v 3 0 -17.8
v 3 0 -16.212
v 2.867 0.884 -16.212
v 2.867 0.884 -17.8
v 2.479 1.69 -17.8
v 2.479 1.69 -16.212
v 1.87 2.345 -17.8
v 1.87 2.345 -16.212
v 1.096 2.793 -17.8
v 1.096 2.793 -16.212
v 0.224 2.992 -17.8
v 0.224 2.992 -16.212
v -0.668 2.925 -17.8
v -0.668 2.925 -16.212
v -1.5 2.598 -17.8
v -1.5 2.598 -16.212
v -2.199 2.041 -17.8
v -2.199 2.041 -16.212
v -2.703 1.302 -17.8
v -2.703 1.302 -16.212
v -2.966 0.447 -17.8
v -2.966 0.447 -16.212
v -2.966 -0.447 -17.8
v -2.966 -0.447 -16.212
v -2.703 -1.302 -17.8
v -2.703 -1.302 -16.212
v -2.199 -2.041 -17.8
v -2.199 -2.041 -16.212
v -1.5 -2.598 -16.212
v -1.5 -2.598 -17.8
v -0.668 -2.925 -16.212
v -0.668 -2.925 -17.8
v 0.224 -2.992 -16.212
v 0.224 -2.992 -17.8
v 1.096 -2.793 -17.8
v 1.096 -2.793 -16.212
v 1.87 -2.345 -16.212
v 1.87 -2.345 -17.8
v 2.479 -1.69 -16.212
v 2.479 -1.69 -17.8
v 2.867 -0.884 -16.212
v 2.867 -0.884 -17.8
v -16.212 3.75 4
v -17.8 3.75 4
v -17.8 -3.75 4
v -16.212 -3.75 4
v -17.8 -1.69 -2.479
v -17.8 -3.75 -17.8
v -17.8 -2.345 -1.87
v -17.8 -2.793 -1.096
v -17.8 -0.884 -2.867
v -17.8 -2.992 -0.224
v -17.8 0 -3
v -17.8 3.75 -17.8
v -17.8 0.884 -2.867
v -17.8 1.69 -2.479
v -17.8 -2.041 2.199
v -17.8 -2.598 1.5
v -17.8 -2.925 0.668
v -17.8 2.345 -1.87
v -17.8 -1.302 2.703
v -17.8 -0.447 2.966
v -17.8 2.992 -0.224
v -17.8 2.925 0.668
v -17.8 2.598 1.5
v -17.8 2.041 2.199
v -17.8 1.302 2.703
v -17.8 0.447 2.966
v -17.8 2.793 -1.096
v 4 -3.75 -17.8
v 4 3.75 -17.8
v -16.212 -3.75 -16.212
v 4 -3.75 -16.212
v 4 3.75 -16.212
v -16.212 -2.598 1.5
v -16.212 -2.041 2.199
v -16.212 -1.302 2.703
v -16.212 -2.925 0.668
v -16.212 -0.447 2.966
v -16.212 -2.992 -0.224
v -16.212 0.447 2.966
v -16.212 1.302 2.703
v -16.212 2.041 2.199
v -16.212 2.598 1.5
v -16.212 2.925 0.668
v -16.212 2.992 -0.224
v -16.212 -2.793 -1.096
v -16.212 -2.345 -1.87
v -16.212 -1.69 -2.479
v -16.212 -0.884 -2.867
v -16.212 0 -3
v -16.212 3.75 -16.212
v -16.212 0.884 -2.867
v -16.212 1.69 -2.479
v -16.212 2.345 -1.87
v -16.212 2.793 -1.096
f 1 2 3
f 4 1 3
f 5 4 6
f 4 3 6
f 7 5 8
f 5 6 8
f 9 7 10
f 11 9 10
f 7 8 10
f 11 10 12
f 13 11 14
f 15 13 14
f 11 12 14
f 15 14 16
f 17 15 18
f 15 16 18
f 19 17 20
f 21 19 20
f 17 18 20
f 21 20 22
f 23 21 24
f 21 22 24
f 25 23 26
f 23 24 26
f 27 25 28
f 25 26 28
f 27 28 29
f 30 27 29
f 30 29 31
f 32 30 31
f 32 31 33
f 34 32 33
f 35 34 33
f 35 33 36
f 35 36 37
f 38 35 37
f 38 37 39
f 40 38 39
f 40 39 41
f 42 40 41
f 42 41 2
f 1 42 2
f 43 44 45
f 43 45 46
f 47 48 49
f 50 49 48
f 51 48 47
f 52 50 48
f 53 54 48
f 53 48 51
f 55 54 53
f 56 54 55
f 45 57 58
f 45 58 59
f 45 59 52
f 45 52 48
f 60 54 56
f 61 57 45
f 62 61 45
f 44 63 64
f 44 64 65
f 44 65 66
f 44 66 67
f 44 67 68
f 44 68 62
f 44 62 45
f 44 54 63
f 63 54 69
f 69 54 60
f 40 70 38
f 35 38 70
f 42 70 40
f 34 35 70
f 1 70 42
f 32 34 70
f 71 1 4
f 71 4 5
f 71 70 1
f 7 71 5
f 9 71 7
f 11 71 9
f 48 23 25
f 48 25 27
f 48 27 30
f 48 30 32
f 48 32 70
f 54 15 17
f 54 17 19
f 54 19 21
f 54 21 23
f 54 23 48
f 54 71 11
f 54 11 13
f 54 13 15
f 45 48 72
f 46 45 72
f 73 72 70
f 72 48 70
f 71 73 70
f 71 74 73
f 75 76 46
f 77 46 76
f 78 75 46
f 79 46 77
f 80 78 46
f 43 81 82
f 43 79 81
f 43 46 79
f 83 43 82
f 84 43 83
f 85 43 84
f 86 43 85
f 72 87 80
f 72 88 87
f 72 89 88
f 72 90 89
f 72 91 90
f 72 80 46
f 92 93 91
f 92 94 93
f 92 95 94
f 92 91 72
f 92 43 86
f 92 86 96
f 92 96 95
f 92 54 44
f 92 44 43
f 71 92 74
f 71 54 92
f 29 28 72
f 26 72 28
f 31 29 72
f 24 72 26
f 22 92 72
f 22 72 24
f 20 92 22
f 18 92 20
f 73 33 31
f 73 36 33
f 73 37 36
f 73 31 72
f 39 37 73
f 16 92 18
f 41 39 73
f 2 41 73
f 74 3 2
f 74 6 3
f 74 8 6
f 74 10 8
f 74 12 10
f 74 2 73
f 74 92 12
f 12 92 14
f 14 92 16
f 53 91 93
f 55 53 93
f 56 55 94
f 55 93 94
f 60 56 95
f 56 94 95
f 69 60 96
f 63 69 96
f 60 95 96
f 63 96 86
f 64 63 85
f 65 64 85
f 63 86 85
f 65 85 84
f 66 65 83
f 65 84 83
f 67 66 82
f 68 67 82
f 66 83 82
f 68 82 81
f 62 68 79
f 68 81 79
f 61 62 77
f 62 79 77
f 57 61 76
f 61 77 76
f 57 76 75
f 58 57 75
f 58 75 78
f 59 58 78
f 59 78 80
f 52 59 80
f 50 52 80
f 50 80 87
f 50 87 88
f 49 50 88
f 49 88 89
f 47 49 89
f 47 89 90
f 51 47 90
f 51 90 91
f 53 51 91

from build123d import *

# Parameters (mm, degrees)
BOSS_EXTRUDE1_DEPTH = 3.75
SKETCH2_R           = 3
CUT_EXTRUDE1_DEPTH  = 28.192786842
SKETCH3_R           = 3
CUT_EXTRUDE2_DEPTH  = 28.192786842


with BuildPart() as part:
    # Sketch1 → Boss-Extrude1 (new, symmetric)
    with BuildSketch(Plane(origin=(0, 0, 0), x_dir=(1, 0, 0), z_dir=(0, 1, 0))):
        Polygon((-4, 16.2125), (4, 16.2125), (4, 17.8), (-4, 17.8), (-17.8, 17.8), (-17.8, 4), (-17.8, -4), (-16.2125, -4), (-16.2125, 4), (-16.2125, 16.2125), align=None)
    extrude(amount=BOSS_EXTRUDE1_DEPTH, both=True)

    # Sketch2 → Cut-Extrude1 (cut, through all)
    with BuildSketch(Plane.XY.offset(-16.2125)):
        Circle(SKETCH2_R)
    extrude(amount=-CUT_EXTRUDE1_DEPTH, mode=Mode.SUBTRACT)

    # Sketch3 → Cut-Extrude2 (cut, through all)
    with BuildSketch(Plane(origin=(-16.2125, 0, 0), x_dir=(0, 0, -1), z_dir=(1, 0, 0))):
        Circle(SKETCH3_R)
    extrude(amount=-CUT_EXTRUDE2_DEPTH, mode=Mode.SUBTRACT)


solid = part.part
